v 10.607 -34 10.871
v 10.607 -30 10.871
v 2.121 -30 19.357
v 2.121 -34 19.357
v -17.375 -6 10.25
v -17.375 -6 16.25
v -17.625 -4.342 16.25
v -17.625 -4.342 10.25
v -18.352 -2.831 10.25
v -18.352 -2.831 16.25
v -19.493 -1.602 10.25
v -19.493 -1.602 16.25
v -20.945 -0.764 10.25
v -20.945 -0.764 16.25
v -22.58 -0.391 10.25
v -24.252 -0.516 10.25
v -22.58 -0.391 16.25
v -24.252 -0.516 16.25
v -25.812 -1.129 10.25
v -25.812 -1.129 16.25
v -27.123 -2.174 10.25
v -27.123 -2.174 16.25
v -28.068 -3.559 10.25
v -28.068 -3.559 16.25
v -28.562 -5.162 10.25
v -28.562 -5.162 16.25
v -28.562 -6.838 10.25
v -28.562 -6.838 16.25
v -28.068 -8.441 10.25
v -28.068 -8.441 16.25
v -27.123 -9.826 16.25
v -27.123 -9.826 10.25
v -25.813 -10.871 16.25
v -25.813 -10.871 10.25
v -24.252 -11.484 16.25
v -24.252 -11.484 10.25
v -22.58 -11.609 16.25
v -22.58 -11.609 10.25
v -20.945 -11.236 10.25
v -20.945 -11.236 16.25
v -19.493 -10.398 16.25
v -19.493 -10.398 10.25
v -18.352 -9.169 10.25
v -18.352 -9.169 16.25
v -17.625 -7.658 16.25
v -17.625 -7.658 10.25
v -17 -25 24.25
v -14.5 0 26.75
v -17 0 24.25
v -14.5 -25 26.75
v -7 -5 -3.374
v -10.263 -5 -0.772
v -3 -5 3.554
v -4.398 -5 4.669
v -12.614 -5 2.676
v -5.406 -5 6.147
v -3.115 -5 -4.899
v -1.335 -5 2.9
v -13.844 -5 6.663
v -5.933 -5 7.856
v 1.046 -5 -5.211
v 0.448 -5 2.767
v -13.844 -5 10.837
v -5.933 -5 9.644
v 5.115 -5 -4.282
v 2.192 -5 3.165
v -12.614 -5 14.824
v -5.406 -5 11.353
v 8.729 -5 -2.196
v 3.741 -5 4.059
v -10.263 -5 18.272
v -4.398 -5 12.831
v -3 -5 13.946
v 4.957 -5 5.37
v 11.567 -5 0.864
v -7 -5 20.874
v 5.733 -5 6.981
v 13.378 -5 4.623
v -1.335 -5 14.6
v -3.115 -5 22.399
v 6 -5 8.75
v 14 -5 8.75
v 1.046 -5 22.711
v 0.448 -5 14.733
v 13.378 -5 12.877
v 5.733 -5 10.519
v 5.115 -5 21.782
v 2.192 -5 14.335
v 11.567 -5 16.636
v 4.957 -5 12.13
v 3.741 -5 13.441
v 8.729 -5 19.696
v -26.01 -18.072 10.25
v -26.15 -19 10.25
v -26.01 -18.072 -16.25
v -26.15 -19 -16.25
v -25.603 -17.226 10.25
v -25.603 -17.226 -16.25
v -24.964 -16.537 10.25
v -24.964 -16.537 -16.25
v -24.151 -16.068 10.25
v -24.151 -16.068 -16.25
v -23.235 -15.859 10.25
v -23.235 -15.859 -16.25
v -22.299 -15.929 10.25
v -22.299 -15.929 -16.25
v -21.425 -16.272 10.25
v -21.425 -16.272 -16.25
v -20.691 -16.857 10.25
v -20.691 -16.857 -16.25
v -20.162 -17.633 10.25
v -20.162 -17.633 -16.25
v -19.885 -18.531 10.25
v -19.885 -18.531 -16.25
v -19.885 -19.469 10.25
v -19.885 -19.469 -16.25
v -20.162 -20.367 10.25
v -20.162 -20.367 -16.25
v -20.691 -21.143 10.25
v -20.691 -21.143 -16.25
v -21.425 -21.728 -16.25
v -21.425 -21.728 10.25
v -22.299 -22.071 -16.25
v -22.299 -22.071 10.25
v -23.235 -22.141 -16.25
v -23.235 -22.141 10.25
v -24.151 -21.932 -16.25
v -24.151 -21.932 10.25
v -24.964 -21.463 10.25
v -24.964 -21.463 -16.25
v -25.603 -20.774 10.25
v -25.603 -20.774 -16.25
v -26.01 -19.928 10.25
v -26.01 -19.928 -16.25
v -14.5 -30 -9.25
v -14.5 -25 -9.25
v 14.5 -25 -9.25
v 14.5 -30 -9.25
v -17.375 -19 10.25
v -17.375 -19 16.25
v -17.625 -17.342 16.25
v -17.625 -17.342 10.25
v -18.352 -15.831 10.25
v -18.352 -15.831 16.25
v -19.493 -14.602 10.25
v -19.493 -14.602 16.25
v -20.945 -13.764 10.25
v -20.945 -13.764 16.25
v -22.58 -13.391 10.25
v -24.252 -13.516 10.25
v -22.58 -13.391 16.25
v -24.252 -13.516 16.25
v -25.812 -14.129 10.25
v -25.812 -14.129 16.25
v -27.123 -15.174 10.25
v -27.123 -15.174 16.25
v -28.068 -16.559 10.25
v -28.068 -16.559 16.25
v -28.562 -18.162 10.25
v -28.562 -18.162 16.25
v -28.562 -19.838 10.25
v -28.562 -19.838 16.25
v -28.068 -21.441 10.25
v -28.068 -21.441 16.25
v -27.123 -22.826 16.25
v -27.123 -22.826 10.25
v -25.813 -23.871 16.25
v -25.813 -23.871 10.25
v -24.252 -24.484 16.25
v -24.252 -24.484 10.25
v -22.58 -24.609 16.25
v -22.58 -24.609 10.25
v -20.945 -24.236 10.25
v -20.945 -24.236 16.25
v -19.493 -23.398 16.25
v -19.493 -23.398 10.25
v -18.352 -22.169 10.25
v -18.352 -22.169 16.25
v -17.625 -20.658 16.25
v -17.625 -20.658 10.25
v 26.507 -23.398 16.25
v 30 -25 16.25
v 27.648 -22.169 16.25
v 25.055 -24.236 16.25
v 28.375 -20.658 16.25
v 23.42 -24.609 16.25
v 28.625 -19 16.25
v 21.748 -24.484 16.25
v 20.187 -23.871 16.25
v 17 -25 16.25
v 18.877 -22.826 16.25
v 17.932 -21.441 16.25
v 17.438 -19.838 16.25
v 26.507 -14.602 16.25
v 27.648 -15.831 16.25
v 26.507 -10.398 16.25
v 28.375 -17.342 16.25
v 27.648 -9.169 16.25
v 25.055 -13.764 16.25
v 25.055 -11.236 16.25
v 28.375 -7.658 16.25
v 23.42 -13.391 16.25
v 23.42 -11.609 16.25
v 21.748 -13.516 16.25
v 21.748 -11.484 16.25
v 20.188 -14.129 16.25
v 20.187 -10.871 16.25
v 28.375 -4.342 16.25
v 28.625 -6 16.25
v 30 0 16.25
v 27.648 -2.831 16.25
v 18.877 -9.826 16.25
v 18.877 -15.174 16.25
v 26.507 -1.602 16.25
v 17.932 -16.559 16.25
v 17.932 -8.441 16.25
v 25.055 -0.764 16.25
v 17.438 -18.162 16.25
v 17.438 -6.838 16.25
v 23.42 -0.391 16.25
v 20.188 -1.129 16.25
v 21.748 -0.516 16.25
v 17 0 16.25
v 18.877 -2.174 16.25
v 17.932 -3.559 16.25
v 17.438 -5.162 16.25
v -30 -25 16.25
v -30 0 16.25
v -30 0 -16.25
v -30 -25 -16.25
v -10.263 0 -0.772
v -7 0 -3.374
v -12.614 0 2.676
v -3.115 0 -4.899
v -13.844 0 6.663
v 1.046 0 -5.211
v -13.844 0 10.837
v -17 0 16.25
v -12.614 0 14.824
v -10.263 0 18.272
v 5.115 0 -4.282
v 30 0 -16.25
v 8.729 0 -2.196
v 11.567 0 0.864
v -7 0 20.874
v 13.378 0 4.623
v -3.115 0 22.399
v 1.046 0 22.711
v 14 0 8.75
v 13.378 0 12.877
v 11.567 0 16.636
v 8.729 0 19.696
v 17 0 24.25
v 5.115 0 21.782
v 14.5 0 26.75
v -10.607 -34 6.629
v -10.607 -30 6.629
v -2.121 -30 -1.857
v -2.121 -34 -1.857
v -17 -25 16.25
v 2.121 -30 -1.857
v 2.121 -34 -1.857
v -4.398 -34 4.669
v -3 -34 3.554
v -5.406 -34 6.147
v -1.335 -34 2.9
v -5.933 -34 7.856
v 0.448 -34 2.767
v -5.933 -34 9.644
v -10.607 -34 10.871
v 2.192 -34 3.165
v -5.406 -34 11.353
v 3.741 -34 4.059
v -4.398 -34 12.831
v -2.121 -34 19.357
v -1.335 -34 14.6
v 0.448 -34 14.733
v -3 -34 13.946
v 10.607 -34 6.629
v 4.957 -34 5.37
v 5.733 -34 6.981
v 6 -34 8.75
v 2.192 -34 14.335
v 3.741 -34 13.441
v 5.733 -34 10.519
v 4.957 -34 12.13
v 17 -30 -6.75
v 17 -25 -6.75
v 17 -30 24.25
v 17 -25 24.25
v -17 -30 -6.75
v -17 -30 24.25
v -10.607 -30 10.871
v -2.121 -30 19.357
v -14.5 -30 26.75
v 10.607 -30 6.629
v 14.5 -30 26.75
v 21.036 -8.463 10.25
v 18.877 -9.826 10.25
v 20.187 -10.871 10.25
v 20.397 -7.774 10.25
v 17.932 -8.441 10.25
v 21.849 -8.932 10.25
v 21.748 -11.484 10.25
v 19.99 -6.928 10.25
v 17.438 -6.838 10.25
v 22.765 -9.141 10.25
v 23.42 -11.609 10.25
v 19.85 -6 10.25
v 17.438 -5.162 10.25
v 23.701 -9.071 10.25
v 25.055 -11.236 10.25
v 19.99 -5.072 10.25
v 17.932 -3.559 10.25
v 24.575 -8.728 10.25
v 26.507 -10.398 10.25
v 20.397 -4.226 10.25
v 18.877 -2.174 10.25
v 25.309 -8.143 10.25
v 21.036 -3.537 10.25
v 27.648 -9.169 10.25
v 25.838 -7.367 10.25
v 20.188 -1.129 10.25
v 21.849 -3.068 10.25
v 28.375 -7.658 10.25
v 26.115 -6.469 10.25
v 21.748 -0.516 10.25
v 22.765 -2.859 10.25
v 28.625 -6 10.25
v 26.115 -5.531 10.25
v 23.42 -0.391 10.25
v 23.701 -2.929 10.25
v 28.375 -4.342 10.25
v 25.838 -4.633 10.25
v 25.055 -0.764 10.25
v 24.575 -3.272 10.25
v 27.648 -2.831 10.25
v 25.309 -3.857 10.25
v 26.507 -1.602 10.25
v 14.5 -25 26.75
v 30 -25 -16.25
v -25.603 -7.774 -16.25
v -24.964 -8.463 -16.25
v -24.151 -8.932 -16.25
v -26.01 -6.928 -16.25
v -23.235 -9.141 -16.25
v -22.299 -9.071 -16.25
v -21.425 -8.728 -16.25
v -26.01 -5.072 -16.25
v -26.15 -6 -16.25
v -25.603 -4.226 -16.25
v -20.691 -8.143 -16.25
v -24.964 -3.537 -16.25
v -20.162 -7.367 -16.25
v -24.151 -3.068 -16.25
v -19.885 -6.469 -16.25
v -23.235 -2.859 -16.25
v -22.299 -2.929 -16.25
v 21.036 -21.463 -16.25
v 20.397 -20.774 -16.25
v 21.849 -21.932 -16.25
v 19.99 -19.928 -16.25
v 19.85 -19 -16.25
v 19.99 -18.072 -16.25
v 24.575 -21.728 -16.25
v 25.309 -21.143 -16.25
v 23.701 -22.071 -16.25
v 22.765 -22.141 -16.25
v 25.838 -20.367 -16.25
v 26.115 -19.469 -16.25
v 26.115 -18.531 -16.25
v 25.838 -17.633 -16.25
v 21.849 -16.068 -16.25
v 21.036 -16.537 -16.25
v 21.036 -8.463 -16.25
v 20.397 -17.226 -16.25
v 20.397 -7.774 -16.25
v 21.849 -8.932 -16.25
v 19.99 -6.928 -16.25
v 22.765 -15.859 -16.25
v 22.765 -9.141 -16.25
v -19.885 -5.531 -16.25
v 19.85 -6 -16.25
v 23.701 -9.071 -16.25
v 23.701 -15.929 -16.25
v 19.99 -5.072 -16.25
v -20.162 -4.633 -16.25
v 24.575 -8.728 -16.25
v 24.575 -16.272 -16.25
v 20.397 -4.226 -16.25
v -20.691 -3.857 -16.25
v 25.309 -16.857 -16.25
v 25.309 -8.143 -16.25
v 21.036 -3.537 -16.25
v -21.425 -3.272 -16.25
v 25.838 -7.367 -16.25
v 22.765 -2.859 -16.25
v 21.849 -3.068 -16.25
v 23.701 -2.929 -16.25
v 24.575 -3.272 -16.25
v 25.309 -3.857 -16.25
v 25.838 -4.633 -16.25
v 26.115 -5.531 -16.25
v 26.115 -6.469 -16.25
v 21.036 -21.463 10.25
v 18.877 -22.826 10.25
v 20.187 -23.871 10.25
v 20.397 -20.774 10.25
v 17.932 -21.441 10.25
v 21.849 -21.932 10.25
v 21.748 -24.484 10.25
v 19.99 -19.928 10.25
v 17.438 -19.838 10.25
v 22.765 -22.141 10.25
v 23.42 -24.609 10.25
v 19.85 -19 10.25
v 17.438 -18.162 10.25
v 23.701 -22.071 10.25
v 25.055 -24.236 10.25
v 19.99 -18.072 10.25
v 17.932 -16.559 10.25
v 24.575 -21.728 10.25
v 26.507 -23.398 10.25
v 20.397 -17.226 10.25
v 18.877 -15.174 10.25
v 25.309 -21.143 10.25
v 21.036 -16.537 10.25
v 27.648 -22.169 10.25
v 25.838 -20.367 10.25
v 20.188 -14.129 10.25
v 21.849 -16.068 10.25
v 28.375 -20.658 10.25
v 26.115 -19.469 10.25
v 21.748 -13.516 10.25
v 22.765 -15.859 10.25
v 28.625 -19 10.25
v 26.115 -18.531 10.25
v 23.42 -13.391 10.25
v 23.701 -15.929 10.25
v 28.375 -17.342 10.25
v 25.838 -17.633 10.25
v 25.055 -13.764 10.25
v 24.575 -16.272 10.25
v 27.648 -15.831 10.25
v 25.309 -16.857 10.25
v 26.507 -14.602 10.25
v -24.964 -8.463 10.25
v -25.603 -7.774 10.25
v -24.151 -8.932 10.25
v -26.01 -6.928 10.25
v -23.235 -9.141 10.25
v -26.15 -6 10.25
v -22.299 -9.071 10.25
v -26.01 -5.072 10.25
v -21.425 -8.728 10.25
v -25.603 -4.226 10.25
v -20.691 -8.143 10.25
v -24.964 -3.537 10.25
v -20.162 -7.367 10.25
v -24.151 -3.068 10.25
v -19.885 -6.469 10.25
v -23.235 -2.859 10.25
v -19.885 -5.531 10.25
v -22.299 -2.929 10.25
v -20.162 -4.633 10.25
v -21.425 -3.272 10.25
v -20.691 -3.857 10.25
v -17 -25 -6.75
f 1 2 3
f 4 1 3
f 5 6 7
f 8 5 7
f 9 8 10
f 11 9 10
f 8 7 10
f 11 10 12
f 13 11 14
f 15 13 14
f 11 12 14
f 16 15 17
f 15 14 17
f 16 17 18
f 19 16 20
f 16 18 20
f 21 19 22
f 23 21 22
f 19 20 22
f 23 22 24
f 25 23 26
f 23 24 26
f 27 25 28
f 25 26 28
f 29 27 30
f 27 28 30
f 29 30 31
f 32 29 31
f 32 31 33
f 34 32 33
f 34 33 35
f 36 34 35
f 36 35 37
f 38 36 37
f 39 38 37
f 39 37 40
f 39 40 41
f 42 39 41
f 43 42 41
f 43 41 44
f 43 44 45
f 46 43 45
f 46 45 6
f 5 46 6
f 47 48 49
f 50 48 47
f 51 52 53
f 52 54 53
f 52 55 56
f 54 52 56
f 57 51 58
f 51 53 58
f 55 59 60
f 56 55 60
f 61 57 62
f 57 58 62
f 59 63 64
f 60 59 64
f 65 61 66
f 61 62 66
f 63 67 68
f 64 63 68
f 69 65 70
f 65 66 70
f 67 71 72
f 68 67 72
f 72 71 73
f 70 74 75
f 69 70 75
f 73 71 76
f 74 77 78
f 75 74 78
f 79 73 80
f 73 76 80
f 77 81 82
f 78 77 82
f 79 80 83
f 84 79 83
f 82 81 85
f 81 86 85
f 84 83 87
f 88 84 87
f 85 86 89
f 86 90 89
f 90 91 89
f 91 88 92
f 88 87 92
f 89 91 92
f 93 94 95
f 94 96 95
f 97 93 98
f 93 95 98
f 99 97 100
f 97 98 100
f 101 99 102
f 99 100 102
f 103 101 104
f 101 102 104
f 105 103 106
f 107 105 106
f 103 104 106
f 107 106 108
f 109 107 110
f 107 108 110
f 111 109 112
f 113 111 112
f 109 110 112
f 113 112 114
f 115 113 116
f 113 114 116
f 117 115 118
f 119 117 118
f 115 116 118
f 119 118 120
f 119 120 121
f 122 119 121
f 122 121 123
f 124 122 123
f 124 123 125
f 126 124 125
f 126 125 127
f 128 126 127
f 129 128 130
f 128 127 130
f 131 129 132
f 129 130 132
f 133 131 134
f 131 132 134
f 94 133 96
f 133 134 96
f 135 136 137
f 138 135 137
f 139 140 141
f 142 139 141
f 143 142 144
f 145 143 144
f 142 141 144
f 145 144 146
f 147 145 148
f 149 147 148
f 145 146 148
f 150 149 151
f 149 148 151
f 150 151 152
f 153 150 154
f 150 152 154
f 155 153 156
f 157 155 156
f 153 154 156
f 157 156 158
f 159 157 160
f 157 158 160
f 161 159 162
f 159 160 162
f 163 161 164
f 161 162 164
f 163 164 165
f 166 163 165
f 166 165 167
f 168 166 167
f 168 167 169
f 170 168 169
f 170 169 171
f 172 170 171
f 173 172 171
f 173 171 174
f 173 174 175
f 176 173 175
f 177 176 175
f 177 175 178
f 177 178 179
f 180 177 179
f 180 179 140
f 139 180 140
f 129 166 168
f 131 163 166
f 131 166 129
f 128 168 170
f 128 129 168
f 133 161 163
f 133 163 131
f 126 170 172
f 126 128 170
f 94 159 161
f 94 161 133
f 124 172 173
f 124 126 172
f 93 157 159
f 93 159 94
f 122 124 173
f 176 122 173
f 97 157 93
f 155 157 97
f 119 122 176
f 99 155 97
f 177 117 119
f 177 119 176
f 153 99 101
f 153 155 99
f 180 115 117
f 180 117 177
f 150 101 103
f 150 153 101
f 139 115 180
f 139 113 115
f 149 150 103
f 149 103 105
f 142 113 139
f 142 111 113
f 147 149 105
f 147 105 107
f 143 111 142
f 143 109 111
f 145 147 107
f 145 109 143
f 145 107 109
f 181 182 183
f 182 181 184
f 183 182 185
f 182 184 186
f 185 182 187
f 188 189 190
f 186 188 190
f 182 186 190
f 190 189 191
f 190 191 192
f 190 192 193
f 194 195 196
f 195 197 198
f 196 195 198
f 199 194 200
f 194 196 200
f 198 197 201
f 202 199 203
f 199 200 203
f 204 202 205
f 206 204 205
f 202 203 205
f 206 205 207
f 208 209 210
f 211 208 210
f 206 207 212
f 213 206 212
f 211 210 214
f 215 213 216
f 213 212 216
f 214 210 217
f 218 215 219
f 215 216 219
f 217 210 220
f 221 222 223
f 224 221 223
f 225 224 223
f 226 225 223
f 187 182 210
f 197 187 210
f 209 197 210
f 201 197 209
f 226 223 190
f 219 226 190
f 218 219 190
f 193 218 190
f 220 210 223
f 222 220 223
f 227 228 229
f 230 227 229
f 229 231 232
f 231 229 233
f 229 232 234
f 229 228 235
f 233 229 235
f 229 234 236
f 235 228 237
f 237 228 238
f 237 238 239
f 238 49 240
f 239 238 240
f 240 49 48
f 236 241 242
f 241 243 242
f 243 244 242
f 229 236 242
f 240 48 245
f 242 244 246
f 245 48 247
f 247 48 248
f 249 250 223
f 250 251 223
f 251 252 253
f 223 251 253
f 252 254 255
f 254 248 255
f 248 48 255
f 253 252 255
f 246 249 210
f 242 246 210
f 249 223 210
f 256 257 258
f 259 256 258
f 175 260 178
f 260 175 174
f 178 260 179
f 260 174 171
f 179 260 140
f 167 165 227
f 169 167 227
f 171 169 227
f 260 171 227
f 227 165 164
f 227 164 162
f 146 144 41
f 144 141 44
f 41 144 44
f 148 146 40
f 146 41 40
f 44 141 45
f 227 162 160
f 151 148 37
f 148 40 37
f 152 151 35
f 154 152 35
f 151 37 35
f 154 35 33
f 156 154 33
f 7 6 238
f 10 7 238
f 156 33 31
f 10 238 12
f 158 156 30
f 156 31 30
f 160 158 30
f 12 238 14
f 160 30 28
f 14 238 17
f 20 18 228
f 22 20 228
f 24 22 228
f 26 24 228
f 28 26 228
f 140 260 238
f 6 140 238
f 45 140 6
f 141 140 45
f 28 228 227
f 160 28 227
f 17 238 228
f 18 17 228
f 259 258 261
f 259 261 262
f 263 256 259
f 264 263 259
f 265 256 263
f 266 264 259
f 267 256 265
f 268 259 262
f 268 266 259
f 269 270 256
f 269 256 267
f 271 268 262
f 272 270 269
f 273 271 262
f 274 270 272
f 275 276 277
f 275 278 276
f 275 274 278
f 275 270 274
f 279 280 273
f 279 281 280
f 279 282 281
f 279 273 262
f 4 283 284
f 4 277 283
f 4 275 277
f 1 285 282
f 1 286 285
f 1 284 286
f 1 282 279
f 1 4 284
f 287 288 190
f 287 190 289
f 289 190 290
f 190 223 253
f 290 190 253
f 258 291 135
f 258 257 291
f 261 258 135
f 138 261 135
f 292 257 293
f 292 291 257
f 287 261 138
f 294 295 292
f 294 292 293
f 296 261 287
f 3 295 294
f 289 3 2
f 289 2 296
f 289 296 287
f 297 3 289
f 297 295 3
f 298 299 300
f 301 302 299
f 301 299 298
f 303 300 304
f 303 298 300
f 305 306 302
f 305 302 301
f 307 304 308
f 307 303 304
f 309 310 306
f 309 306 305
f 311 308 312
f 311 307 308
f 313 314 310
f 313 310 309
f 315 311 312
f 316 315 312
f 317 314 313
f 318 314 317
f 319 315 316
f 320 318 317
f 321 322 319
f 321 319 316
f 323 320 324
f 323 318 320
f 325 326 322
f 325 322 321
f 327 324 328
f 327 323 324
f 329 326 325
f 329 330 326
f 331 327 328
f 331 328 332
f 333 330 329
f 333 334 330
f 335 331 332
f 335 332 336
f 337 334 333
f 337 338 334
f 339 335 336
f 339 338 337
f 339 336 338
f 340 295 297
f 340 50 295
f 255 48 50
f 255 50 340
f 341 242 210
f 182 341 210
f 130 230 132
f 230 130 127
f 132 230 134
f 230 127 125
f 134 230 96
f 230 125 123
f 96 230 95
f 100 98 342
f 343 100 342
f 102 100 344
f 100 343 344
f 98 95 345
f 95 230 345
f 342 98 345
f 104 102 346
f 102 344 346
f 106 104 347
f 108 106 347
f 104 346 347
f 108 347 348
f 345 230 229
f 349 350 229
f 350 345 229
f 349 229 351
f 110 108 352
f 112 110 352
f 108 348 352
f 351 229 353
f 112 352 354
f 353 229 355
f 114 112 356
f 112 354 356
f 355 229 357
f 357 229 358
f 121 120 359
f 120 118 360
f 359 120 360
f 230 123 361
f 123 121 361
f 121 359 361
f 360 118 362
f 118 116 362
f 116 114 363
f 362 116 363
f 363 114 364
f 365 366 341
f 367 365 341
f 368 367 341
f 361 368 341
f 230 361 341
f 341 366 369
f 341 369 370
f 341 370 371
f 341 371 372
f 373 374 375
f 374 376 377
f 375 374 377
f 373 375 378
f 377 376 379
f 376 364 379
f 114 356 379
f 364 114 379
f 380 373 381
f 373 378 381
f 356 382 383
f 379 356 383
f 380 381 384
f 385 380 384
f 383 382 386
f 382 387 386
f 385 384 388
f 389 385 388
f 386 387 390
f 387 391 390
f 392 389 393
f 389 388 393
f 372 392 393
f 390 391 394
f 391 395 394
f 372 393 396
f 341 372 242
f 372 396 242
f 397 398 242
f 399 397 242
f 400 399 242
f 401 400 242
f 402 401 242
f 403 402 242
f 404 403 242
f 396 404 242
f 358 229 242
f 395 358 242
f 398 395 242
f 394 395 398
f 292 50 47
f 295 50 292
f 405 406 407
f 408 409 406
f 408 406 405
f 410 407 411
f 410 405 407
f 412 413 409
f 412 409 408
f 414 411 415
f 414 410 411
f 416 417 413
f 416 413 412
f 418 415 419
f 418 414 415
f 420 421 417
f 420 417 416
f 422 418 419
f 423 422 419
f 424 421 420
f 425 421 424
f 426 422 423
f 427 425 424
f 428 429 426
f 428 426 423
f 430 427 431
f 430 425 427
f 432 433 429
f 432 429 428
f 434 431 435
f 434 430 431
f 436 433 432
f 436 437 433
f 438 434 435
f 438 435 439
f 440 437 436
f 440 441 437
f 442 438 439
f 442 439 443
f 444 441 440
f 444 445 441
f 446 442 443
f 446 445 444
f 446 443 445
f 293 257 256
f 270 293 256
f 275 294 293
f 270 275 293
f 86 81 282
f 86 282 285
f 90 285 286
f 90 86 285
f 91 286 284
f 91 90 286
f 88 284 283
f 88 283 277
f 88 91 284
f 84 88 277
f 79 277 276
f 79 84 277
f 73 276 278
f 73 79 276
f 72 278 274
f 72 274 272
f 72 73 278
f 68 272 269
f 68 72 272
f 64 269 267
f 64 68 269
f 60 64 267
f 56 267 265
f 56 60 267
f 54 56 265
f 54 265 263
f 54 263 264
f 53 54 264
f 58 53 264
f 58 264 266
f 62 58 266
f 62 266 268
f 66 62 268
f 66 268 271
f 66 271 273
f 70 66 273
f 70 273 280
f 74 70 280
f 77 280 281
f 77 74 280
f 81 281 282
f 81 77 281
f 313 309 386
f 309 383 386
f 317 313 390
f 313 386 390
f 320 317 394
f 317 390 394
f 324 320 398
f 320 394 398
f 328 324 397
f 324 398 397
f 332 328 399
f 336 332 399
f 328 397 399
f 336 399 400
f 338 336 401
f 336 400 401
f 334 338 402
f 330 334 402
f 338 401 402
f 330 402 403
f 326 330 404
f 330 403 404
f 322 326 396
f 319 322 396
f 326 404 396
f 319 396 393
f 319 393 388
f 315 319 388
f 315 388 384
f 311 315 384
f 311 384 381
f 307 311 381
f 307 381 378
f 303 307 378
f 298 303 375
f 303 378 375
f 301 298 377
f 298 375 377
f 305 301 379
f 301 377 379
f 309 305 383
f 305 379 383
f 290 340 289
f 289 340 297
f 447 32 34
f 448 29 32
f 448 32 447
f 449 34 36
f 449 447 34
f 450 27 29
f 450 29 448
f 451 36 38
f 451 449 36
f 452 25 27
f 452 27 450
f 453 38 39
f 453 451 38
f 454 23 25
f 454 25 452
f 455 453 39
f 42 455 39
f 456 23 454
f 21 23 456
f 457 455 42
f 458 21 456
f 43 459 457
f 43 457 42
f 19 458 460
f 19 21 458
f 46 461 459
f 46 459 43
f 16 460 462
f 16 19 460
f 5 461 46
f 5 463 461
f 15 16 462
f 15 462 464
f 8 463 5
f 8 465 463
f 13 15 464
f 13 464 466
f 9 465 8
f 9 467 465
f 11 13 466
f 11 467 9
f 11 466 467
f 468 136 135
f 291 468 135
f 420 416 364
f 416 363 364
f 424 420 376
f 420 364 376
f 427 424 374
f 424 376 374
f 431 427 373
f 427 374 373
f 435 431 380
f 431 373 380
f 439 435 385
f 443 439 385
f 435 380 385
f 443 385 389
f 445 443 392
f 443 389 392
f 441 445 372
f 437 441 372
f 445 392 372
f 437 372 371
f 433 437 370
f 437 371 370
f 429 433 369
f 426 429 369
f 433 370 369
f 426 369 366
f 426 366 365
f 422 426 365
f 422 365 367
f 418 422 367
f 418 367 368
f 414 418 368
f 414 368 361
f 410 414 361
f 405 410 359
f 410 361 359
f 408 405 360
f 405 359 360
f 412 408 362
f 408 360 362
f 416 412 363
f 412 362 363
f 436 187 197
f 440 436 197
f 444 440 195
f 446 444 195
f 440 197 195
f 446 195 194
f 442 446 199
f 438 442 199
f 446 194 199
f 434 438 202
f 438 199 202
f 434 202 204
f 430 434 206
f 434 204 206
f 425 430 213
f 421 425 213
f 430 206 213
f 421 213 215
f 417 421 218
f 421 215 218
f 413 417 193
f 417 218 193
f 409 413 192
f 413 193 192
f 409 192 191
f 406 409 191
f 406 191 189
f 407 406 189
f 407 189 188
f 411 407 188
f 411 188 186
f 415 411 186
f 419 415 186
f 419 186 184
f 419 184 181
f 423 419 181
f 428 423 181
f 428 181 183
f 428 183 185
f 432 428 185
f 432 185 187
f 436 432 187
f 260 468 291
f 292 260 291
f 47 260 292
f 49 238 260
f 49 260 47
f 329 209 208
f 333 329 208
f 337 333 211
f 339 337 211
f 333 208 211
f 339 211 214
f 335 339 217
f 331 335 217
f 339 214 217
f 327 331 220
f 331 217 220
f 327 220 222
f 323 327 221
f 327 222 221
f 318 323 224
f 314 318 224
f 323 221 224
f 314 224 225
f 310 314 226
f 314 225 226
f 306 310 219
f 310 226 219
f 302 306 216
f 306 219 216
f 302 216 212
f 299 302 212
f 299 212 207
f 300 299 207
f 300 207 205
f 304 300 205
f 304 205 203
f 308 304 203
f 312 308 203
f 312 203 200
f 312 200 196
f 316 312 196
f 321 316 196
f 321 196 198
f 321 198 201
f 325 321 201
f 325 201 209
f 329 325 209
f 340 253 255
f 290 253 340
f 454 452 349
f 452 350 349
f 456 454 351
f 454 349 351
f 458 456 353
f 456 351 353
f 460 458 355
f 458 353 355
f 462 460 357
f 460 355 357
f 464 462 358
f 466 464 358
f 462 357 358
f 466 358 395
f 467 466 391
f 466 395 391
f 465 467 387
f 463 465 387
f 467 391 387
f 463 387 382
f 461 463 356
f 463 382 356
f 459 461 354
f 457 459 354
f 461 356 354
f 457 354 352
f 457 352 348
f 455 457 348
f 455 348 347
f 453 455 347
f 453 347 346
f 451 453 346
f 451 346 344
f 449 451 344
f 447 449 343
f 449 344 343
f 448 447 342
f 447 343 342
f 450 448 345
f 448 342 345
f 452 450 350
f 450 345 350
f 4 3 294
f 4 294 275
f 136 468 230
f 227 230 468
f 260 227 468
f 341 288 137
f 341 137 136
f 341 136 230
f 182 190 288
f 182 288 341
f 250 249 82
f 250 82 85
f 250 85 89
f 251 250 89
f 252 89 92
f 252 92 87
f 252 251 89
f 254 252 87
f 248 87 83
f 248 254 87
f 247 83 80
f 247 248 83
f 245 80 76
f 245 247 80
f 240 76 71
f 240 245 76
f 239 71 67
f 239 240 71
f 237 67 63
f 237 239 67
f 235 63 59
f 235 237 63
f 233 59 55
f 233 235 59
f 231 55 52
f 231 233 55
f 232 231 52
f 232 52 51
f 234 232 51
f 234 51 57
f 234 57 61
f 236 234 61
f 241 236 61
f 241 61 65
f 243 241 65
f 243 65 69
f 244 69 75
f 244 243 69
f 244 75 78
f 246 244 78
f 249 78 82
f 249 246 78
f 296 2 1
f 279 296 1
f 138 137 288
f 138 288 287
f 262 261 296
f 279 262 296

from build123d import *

# Parameters (mm, degrees)
F0_R           = 14
F0_R_2         = 6
F1_DEPTH       = 25
F3_D           = 6.3
F3_CBORE_D     = 11.25
F3_CBORE_DEPTH = 6
F4_SIZE        = 2.5
F5_W           = 34
F5_H           = 36
F5_R           = 6
F6_DEPTH       = 5
F7_SIZE        = 2.49999
F8_R           = 6
F9_DEPTH       = 4
F10_SIZE       = 3
F11_DEPTH      = 5


# Not quite as in the source:
# - a fillet or chamfer is up to 0.001 mm smaller than in the source, because OpenCascade refuses the exact size
# - a feature names something its author has since deleted; it is built from what else it names


with BuildPart() as f1:
    # F0 (on Front) → F1 (new body)
    with BuildSketch(Plane.XZ):
        Polygon((-30, 16.25), (-30, -16.25), (30, -16.25), (30, 16.25), (17, 16.25), (17, 26.75), (-17, 26.75), (-17, 16.25), align=None)
        with Locations((0, 8.75)):
            Circle(F0_R, mode=Mode.SUBTRACT)
        with Locations((0, 8.75)):
            Circle(F0_R)
        with Locations((0, 8.75)):
            Circle(F0_R_2, mode=Mode.SUBTRACT)
    extrude(amount=F1_DEPTH)

    # F3 (through all)
    with Locations(Plane.XY.offset(16.25)):
        with Locations((-23, -6), (-23, -19), (23, -6), (23, -19)):
            CounterBoreHole(F3_D / 2, F3_CBORE_D / 2, F3_CBORE_DEPTH)

    # F4
    f4_edges = [f1.edges().sort_by_distance(p)[0] for p in [
        (17, -12.5, 26.75),
        (-17, -12.5, 26.75),
    ]]
    chamfer(f4_edges, length=F4_SIZE)

    # F5 (on face) → F6 (join)
    with BuildSketch(Plane.XZ.offset(25)):
        with Locations((0, 8.75)):
            Rectangle(F5_W, F5_H)
        with Locations((0, 8.75)):
            Circle(F5_R, mode=Mode.SUBTRACT)
    extrude(amount=F6_DEPTH)

    # F7 (size 2.5 in the source; OpenCascade refuses exactly that, so slightly less here)
    f7_edges = [f1.edges().sort_by_distance(p)[0] for p in [
        (17, -27.5, 26.75),
        (-17, -27.5, 26.75),
        (17, -27.5, -9.25),
        (-17, -27.5, -9.25),
    ]]
    chamfer(f7_edges, length=F7_SIZE)

    # F8 (on face) → F9 (join)
    with BuildSketch(Plane.XZ.offset(30)):
        Polygon((0, 21.4779220614), (-12.7279220614, 8.75), (0, -3.9779220614), (12.7279220614, 8.75), align=None)
        with Locations((0, 8.75)):
            Circle(F8_R, mode=Mode.SUBTRACT)
    extrude(amount=F9_DEPTH)

    # F10
    f10_edges = [f1.edges().sort_by_distance(p)[0] for p in [
        (0, -32, 21.477922),
        (12.727922, -32, 8.75),
        (-12.727922, -32, 8.75),
        (0, -32, -3.977922),
    ]]
    chamfer(f10_edges, length=F10_SIZE)

    # F0 (on Front) → F11 (cut)
    with BuildSketch(Plane.XZ):
        with Locations((0, 8.75)):
            Circle(F0_R)
        with Locations((0, 8.75)):
            Circle(F0_R_2, mode=Mode.SUBTRACT)
    extrude(amount=F11_DEPTH, mode=Mode.SUBTRACT)


solid = f1.part
